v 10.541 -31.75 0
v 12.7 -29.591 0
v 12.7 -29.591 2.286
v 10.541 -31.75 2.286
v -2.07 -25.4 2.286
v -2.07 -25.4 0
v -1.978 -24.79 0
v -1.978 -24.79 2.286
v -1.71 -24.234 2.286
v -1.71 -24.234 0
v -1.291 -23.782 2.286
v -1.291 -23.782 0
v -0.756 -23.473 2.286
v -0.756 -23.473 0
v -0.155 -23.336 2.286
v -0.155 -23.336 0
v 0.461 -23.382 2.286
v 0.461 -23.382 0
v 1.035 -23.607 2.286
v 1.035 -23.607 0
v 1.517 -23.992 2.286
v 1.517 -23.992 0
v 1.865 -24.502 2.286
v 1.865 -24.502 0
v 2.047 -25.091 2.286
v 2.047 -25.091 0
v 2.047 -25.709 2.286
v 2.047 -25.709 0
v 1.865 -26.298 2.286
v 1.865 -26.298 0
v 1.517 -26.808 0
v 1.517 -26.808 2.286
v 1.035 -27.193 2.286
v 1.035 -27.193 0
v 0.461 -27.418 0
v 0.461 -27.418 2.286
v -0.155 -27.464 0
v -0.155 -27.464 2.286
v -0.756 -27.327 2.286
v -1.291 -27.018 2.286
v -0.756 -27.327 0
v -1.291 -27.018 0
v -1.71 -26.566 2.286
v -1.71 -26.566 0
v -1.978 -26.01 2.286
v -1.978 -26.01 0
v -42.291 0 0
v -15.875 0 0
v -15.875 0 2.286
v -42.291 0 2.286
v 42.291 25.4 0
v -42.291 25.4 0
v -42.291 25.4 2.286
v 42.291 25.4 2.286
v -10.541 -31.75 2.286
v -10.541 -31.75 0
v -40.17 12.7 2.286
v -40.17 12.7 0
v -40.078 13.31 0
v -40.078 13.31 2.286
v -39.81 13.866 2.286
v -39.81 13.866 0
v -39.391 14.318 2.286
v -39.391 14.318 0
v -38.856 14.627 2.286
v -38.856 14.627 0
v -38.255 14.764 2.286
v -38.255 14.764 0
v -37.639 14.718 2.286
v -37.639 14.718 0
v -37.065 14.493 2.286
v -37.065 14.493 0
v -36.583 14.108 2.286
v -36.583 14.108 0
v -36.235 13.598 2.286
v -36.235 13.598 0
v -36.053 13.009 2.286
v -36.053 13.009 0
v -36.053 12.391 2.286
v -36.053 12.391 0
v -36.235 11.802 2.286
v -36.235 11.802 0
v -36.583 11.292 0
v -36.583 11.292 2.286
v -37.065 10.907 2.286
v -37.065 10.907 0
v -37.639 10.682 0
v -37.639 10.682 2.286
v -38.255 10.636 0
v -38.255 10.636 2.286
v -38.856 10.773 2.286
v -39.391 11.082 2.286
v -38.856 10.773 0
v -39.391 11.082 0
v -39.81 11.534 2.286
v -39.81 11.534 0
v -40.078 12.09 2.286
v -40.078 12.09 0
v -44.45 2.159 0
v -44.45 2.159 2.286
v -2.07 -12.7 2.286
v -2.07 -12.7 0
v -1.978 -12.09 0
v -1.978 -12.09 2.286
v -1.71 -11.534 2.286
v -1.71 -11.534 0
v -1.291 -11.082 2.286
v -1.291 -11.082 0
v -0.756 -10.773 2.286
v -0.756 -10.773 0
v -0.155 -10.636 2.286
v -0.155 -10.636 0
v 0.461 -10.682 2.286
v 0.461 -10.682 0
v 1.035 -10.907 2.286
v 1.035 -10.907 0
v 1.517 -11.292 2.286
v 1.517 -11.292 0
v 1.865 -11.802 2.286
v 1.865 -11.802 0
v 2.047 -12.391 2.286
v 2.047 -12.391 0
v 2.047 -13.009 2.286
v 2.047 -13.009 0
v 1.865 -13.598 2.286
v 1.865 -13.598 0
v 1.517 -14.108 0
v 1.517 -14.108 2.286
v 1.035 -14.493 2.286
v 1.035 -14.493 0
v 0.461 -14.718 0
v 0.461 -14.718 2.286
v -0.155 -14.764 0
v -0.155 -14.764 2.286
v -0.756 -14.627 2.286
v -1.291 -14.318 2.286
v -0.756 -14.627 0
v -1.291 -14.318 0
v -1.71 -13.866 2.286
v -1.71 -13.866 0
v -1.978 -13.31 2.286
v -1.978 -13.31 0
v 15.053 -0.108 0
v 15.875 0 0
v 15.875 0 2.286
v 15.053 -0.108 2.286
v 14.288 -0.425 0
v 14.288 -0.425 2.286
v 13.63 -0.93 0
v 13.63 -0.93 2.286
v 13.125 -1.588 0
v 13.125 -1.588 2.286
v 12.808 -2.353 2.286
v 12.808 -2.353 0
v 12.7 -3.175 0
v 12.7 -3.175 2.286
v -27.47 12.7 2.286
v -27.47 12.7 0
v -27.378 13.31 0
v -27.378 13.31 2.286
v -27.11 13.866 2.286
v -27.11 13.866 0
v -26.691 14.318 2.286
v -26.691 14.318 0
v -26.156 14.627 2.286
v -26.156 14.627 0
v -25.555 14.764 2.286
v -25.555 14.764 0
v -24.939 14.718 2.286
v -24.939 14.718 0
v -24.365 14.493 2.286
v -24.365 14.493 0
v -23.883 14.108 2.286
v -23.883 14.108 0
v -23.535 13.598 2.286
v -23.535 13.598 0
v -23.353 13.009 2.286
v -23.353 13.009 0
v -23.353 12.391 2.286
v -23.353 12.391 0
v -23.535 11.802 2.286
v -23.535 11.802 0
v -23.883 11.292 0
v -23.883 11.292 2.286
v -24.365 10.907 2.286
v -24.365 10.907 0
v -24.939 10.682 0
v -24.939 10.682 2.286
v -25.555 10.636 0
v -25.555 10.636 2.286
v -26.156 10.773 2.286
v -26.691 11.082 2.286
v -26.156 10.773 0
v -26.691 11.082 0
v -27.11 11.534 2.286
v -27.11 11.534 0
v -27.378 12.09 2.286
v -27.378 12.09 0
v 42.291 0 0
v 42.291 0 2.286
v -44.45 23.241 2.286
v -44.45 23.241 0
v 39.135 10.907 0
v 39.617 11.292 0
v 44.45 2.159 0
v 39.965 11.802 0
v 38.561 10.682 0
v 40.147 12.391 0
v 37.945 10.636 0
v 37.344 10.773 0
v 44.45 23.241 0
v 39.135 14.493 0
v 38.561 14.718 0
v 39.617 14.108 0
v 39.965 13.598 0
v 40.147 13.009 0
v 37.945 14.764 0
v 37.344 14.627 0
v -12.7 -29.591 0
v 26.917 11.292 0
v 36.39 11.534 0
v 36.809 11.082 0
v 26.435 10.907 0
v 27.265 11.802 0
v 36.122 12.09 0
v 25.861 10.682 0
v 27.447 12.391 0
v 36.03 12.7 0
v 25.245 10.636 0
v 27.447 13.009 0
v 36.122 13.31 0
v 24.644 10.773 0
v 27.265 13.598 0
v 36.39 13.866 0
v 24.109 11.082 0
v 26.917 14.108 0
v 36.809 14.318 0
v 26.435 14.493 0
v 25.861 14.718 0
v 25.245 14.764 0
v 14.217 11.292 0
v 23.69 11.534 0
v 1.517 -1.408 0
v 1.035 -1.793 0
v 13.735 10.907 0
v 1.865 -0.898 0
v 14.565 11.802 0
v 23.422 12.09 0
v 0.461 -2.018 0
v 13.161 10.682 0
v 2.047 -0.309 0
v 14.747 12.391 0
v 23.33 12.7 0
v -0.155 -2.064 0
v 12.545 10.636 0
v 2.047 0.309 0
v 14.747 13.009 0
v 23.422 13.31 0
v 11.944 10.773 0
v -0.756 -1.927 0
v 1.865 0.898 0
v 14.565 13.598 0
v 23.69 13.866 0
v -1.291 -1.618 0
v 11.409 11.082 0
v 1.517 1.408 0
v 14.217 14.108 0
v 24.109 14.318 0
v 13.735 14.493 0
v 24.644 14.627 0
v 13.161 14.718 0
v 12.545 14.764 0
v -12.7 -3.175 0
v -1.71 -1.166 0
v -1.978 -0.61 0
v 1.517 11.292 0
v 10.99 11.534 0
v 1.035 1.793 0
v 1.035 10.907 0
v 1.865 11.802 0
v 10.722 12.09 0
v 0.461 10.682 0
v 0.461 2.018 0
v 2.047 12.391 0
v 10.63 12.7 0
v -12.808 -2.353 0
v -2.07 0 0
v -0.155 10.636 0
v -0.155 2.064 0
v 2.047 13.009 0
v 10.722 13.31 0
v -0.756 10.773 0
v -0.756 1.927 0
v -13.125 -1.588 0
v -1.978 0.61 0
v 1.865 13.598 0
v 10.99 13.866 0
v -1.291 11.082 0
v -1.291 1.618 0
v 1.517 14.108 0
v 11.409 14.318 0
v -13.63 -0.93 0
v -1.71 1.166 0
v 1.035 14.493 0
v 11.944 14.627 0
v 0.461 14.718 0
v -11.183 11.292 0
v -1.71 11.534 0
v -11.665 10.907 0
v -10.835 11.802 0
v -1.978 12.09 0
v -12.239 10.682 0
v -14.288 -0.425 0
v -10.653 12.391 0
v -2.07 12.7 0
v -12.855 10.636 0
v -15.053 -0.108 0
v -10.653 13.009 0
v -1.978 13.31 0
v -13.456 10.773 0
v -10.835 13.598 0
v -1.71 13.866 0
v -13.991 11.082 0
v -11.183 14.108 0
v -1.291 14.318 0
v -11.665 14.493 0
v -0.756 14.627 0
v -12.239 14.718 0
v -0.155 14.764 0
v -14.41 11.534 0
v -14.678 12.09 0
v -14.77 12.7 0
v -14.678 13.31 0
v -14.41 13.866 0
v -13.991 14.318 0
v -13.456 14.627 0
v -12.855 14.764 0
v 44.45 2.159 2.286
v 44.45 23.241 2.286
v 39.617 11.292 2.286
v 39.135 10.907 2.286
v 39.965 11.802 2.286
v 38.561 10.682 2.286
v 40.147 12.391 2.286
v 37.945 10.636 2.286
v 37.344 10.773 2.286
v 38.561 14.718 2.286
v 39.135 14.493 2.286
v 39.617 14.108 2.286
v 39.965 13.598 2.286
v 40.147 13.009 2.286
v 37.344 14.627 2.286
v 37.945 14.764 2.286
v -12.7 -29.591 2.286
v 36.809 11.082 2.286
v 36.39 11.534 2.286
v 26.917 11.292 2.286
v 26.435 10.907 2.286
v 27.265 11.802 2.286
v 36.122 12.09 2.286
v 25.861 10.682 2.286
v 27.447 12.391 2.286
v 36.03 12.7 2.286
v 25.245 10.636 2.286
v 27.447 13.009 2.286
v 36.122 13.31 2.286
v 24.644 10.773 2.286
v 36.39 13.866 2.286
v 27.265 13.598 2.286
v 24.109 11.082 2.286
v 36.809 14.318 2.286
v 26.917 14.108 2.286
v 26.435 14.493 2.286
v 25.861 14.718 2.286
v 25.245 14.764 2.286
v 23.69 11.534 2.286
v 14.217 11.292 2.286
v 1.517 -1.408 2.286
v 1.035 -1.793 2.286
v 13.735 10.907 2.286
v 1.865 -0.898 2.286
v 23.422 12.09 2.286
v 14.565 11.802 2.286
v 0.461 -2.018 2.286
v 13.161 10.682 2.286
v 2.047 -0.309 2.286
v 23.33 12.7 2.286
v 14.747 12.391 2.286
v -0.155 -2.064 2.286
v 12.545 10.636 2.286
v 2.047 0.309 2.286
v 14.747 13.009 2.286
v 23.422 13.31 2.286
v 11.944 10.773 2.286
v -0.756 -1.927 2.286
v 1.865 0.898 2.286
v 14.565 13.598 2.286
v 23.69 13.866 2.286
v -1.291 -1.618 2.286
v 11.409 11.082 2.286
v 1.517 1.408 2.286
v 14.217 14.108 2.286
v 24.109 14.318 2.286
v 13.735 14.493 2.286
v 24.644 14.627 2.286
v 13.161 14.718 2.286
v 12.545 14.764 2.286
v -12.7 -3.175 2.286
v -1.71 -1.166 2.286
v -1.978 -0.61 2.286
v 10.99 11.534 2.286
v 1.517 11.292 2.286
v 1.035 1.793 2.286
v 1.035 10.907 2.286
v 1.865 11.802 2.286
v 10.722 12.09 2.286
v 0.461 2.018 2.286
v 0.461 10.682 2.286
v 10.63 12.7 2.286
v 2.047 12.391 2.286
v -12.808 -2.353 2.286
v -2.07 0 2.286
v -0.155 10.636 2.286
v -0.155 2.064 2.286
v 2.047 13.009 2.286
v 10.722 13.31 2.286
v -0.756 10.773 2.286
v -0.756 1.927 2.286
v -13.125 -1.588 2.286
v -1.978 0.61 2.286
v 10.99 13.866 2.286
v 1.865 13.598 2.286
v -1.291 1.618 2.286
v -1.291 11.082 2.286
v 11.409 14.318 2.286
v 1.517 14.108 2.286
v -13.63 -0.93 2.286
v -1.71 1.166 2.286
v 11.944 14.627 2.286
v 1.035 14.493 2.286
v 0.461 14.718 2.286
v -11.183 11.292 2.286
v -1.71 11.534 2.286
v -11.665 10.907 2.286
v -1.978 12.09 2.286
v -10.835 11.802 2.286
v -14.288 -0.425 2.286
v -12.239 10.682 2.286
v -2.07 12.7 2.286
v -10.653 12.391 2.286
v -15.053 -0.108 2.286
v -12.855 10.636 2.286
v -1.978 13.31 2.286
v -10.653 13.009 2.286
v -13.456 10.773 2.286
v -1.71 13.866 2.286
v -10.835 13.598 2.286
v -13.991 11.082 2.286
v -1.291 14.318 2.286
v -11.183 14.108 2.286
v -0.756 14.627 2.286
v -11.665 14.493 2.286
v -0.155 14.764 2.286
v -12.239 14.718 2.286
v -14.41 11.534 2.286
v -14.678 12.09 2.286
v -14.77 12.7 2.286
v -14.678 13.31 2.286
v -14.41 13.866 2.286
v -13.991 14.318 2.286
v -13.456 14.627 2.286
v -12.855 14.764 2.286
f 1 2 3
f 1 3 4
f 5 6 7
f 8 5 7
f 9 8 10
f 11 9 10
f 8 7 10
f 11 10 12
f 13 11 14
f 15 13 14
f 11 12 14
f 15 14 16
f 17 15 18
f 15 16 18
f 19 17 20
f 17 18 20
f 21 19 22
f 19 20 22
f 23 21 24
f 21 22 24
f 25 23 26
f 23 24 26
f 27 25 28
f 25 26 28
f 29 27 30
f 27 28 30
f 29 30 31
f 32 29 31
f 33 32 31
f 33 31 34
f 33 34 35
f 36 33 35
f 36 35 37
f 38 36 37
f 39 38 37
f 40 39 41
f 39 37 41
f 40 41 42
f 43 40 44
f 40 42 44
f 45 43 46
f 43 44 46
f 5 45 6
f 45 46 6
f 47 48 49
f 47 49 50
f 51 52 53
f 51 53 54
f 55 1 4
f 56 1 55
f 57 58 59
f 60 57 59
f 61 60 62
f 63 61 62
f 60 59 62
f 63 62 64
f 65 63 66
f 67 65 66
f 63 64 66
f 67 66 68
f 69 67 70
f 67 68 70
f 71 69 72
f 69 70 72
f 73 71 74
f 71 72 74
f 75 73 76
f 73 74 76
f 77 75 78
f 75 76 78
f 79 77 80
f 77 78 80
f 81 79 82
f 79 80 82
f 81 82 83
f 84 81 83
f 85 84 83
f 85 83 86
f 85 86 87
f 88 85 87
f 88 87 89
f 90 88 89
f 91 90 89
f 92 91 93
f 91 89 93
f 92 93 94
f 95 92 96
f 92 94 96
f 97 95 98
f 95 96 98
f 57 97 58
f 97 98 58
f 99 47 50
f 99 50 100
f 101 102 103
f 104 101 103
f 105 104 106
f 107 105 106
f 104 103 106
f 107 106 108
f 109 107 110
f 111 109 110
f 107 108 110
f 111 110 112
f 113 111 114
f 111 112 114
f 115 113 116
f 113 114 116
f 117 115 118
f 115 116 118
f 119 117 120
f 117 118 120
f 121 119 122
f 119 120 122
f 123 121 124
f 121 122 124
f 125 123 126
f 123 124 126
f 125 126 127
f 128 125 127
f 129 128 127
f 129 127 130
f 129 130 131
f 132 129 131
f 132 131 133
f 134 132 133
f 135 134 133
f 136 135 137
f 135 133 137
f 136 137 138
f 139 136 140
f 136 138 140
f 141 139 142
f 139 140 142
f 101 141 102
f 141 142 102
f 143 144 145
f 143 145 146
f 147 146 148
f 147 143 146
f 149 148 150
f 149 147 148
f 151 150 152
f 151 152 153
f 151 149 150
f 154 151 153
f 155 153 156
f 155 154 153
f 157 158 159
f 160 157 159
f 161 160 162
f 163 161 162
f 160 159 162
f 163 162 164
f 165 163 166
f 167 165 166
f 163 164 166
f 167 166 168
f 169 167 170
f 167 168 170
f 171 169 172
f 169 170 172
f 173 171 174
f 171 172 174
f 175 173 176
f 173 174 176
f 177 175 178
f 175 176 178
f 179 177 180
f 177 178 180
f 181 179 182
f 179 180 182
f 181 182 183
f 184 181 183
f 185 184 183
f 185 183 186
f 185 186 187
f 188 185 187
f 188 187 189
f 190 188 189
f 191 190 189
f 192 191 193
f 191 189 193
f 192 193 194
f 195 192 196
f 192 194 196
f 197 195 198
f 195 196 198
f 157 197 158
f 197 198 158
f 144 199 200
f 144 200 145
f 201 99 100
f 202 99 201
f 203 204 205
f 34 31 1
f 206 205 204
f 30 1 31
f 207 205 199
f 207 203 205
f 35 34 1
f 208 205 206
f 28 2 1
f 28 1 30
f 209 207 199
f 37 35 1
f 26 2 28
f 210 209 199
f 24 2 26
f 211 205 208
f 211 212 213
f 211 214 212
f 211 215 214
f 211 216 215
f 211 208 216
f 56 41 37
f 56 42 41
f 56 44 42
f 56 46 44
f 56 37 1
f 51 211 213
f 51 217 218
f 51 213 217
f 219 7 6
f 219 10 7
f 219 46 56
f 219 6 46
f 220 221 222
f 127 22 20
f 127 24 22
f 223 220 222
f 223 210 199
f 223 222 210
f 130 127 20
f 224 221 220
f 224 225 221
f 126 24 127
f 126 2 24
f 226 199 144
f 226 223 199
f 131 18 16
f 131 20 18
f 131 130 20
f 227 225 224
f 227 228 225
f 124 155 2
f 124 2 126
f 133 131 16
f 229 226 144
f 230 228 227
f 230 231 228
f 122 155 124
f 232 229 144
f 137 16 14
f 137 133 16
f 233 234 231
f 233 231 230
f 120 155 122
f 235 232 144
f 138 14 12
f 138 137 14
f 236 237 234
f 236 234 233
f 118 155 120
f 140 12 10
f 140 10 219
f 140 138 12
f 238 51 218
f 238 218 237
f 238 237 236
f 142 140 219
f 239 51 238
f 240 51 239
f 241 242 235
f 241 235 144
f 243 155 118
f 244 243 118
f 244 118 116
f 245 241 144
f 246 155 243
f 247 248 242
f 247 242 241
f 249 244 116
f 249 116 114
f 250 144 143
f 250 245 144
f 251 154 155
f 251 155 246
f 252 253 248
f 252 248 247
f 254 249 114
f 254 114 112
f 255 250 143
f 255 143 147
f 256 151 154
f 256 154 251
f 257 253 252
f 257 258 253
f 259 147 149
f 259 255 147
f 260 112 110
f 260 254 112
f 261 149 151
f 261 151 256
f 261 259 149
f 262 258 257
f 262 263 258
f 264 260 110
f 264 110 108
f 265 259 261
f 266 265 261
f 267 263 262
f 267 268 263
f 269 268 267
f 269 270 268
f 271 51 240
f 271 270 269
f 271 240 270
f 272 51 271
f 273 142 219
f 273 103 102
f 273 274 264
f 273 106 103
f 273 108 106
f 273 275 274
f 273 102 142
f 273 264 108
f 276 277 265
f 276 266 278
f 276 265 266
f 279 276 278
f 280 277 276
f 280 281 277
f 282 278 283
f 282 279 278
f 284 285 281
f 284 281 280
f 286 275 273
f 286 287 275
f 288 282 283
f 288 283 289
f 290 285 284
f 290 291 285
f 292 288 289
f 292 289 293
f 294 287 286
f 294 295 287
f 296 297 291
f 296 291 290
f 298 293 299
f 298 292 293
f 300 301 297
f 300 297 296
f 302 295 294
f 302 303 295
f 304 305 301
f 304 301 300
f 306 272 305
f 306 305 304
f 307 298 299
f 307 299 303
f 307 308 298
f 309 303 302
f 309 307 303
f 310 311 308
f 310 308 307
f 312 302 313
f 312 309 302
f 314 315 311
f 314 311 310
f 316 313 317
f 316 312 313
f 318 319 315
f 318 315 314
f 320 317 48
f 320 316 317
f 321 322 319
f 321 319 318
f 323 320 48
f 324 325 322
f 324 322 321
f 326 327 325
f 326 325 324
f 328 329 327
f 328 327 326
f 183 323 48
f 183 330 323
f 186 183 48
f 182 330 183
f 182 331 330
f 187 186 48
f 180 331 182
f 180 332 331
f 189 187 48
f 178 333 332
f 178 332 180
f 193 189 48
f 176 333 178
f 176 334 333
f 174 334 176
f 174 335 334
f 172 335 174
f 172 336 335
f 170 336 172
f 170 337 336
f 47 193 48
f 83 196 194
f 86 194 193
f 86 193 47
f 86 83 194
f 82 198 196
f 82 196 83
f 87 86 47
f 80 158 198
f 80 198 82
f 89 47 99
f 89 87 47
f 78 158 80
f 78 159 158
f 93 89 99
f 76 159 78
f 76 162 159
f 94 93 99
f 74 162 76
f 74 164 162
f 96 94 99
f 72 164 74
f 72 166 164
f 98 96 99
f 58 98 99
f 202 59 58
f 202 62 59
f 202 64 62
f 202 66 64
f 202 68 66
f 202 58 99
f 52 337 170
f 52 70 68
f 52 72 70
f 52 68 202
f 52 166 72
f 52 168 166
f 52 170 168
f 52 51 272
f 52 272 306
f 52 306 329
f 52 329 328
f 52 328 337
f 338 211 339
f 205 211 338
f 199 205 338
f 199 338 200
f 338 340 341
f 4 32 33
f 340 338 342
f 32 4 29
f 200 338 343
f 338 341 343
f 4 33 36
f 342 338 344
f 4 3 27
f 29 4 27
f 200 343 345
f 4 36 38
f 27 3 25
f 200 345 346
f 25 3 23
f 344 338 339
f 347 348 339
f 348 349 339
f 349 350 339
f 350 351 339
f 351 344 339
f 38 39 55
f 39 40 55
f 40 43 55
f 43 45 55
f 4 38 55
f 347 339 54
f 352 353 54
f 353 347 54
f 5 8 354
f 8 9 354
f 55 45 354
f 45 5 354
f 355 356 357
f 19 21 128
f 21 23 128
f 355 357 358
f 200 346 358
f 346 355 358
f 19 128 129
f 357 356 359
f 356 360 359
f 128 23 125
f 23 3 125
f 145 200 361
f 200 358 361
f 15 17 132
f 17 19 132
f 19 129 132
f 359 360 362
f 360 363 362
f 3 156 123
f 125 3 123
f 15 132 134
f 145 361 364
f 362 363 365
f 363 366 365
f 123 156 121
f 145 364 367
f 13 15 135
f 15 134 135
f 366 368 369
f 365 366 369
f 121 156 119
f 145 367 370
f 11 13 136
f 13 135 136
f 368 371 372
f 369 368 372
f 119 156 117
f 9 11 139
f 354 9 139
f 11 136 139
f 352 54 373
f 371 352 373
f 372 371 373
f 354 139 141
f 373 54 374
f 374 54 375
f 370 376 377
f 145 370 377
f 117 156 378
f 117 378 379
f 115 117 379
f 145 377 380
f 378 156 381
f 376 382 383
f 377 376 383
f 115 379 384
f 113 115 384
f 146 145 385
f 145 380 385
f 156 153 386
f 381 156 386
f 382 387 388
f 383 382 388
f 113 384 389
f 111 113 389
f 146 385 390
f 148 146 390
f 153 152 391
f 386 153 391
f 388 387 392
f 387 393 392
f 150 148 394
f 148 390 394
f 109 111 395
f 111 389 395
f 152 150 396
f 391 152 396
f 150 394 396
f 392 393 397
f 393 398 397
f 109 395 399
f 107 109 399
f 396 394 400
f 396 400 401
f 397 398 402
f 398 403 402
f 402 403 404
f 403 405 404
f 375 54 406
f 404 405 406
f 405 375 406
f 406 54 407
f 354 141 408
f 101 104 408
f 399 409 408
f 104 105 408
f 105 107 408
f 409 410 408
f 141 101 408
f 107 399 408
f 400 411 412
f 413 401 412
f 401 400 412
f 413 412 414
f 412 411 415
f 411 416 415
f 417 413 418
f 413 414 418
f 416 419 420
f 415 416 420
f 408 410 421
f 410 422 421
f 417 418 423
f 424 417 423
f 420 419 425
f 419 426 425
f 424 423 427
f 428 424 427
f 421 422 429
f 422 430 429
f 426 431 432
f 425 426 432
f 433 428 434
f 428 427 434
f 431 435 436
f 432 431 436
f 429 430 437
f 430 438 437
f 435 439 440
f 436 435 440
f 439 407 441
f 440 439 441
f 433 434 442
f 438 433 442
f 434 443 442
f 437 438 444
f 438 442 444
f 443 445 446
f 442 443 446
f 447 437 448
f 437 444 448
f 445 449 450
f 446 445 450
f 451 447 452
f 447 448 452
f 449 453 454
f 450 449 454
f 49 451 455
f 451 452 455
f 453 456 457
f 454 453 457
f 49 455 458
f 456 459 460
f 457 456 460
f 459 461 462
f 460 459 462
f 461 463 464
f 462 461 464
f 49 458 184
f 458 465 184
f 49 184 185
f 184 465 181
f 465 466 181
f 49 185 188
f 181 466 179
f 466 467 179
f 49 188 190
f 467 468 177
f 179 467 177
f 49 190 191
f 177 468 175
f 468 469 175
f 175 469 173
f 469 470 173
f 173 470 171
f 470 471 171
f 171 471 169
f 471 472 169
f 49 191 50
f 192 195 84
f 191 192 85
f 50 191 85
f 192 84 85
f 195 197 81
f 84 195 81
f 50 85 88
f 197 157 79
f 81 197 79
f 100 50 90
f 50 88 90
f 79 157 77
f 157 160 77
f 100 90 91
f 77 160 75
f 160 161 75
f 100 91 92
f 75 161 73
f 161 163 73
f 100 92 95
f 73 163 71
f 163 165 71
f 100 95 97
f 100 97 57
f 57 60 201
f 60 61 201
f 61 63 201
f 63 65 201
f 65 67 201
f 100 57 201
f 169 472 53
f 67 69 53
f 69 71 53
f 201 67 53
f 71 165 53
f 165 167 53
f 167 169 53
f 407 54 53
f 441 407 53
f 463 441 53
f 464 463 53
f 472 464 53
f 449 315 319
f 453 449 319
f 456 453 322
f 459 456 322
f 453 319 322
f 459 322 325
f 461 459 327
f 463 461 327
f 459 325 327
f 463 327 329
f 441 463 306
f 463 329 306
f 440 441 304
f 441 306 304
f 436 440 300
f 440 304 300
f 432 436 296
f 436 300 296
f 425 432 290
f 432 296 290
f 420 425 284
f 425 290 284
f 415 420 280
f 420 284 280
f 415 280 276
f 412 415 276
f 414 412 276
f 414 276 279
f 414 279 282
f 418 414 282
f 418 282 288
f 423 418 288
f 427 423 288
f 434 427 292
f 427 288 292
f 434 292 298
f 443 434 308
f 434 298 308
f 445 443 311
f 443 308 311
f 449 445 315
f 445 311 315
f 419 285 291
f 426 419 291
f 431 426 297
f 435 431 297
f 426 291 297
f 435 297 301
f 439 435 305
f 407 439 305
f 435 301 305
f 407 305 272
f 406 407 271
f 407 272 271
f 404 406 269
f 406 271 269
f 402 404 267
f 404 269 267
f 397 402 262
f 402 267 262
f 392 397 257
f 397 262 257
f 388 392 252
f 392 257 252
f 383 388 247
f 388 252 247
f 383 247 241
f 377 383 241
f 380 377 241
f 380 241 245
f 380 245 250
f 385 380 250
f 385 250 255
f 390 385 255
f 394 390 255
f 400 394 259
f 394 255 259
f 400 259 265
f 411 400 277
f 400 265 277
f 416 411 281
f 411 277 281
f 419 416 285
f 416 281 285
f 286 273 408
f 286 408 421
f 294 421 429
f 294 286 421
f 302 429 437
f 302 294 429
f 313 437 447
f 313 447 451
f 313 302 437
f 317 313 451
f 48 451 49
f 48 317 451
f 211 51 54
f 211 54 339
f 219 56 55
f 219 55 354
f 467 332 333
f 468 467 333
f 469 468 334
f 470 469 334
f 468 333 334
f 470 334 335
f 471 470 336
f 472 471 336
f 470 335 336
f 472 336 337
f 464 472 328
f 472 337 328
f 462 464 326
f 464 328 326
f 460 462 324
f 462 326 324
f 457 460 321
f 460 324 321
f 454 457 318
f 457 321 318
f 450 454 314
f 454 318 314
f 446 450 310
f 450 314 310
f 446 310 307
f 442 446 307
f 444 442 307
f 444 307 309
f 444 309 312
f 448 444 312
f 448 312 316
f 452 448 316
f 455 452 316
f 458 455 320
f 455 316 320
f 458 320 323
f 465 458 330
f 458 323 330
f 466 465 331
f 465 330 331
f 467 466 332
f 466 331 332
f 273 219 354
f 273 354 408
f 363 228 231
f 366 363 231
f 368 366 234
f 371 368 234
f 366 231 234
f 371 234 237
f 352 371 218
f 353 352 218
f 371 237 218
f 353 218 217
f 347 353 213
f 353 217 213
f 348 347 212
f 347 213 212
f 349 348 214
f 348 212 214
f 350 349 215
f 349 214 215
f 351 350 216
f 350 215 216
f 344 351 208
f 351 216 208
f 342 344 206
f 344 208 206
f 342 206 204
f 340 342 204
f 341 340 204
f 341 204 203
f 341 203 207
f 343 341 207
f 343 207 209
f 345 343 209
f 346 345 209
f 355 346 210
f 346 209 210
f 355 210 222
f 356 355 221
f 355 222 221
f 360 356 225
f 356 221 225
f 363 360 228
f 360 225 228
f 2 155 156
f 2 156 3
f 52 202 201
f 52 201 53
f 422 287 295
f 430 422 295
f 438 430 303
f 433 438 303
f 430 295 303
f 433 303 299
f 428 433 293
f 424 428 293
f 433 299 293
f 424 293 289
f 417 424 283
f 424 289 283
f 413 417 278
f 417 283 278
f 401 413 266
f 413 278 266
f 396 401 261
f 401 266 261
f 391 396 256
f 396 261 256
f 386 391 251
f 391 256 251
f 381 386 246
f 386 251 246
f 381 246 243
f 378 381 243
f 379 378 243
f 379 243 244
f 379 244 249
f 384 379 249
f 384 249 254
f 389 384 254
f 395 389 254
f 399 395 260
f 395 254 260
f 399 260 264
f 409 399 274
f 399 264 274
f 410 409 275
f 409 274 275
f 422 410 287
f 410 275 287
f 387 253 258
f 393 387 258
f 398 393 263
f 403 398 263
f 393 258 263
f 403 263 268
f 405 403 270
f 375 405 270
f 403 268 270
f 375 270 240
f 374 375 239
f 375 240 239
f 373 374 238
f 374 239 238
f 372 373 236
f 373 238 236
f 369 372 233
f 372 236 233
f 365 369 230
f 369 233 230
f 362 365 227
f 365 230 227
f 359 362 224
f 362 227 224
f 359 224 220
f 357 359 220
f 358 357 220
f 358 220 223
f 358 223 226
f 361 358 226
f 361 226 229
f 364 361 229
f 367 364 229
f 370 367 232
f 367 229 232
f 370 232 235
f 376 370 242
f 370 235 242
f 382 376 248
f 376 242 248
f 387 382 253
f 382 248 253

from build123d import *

# Parameters (mm, degrees)
SKETCH1_R           = 2.0701
BOSS_EXTRUDE1_DEPTH = 2.286


with BuildPart() as part:
    # Sketch1 → Boss-Extrude1 (new body)
    with BuildSketch(Plane(origin=(0, 0, 0), x_dir=(-1, 0, 0), z_dir=(0, 0, -1))):
        with BuildLine():
            Line((-12.7, -29.591), (-10.541, -31.75))
            Line((-10.541, -31.75), (10.541, -31.75))
            Line((10.541, -31.75), (12.7, -29.591))
            Line((12.7, -29.591), (12.7, -3.175))
            ThreePointArc((12.7, -3.175), (13.62993597, -0.92993597), (15.875, 0))
            Line((15.875, 0), (42.291, 0))
            Line((42.291, 0), (44.45, 2.159))
            Line((44.45, 2.159), (44.45, 23.241))
            Line((44.45, 23.241), (42.291, 25.4))
            Line((42.291, 25.4), (-42.291, 25.4))
            Line((-42.291, 25.4), (-44.45, 23.241))
            Line((-44.45, 23.241), (-44.45, 2.159))
            Line((-44.45, 2.159), (-42.291, 0))
            Line((-42.291, 0), (-15.875, 0))
            ThreePointArc((-15.875, 0), (-13.62993597, -0.92993597), (-12.7, -3.175))
            Line((-12.7, -3.175), (-12.7, -29.591))
        make_face()
        with Locations((0, -12.7)):
            Circle(SKETCH1_R, mode=Mode.SUBTRACT)
        with Locations((-38.1, 12.7)):
            Circle(SKETCH1_R, mode=Mode.SUBTRACT)
        with Locations((-12.7, 12.7)):
            Circle(SKETCH1_R, mode=Mode.SUBTRACT)
        with Locations((12.7, 12.7)):
            Circle(SKETCH1_R, mode=Mode.SUBTRACT)
        with Locations((25.4, 12.7)):
            Circle(SKETCH1_R, mode=Mode.SUBTRACT)
        with Locations((38.1, 12.7)):
            Circle(SKETCH1_R, mode=Mode.SUBTRACT)
        with Locations((0, -25.4)):
            Circle(SKETCH1_R, mode=Mode.SUBTRACT)
        with Locations((0, 12.7)):
            Circle(SKETCH1_R, mode=Mode.SUBTRACT)
        with Locations((-25.4, 12.7)):
            Circle(SKETCH1_R, mode=Mode.SUBTRACT)
        Circle(SKETCH1_R, mode=Mode.SUBTRACT)
    extrude(amount=-BOSS_EXTRUDE1_DEPTH)


solid = part.part
